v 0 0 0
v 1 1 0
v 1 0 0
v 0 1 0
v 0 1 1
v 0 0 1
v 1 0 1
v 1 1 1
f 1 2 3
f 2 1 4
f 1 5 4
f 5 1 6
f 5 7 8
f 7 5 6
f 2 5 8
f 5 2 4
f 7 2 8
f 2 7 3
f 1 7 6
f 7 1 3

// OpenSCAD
// linear_extrude(segments=...) with valid and invalid values.
// Values below 0 are clamped to 0 and non-integers are truncated, like slices=.
// Non-finite and non-number values are ignored with a warning.
for (s = [undef, -1, 0, 2.5, 8, 1/0, -1/0, 0/0, "8", true, [8], [1:3]]) {
  echo(segments = s);
  linear_extrude(height = 1, segments = s) square(1);
}
